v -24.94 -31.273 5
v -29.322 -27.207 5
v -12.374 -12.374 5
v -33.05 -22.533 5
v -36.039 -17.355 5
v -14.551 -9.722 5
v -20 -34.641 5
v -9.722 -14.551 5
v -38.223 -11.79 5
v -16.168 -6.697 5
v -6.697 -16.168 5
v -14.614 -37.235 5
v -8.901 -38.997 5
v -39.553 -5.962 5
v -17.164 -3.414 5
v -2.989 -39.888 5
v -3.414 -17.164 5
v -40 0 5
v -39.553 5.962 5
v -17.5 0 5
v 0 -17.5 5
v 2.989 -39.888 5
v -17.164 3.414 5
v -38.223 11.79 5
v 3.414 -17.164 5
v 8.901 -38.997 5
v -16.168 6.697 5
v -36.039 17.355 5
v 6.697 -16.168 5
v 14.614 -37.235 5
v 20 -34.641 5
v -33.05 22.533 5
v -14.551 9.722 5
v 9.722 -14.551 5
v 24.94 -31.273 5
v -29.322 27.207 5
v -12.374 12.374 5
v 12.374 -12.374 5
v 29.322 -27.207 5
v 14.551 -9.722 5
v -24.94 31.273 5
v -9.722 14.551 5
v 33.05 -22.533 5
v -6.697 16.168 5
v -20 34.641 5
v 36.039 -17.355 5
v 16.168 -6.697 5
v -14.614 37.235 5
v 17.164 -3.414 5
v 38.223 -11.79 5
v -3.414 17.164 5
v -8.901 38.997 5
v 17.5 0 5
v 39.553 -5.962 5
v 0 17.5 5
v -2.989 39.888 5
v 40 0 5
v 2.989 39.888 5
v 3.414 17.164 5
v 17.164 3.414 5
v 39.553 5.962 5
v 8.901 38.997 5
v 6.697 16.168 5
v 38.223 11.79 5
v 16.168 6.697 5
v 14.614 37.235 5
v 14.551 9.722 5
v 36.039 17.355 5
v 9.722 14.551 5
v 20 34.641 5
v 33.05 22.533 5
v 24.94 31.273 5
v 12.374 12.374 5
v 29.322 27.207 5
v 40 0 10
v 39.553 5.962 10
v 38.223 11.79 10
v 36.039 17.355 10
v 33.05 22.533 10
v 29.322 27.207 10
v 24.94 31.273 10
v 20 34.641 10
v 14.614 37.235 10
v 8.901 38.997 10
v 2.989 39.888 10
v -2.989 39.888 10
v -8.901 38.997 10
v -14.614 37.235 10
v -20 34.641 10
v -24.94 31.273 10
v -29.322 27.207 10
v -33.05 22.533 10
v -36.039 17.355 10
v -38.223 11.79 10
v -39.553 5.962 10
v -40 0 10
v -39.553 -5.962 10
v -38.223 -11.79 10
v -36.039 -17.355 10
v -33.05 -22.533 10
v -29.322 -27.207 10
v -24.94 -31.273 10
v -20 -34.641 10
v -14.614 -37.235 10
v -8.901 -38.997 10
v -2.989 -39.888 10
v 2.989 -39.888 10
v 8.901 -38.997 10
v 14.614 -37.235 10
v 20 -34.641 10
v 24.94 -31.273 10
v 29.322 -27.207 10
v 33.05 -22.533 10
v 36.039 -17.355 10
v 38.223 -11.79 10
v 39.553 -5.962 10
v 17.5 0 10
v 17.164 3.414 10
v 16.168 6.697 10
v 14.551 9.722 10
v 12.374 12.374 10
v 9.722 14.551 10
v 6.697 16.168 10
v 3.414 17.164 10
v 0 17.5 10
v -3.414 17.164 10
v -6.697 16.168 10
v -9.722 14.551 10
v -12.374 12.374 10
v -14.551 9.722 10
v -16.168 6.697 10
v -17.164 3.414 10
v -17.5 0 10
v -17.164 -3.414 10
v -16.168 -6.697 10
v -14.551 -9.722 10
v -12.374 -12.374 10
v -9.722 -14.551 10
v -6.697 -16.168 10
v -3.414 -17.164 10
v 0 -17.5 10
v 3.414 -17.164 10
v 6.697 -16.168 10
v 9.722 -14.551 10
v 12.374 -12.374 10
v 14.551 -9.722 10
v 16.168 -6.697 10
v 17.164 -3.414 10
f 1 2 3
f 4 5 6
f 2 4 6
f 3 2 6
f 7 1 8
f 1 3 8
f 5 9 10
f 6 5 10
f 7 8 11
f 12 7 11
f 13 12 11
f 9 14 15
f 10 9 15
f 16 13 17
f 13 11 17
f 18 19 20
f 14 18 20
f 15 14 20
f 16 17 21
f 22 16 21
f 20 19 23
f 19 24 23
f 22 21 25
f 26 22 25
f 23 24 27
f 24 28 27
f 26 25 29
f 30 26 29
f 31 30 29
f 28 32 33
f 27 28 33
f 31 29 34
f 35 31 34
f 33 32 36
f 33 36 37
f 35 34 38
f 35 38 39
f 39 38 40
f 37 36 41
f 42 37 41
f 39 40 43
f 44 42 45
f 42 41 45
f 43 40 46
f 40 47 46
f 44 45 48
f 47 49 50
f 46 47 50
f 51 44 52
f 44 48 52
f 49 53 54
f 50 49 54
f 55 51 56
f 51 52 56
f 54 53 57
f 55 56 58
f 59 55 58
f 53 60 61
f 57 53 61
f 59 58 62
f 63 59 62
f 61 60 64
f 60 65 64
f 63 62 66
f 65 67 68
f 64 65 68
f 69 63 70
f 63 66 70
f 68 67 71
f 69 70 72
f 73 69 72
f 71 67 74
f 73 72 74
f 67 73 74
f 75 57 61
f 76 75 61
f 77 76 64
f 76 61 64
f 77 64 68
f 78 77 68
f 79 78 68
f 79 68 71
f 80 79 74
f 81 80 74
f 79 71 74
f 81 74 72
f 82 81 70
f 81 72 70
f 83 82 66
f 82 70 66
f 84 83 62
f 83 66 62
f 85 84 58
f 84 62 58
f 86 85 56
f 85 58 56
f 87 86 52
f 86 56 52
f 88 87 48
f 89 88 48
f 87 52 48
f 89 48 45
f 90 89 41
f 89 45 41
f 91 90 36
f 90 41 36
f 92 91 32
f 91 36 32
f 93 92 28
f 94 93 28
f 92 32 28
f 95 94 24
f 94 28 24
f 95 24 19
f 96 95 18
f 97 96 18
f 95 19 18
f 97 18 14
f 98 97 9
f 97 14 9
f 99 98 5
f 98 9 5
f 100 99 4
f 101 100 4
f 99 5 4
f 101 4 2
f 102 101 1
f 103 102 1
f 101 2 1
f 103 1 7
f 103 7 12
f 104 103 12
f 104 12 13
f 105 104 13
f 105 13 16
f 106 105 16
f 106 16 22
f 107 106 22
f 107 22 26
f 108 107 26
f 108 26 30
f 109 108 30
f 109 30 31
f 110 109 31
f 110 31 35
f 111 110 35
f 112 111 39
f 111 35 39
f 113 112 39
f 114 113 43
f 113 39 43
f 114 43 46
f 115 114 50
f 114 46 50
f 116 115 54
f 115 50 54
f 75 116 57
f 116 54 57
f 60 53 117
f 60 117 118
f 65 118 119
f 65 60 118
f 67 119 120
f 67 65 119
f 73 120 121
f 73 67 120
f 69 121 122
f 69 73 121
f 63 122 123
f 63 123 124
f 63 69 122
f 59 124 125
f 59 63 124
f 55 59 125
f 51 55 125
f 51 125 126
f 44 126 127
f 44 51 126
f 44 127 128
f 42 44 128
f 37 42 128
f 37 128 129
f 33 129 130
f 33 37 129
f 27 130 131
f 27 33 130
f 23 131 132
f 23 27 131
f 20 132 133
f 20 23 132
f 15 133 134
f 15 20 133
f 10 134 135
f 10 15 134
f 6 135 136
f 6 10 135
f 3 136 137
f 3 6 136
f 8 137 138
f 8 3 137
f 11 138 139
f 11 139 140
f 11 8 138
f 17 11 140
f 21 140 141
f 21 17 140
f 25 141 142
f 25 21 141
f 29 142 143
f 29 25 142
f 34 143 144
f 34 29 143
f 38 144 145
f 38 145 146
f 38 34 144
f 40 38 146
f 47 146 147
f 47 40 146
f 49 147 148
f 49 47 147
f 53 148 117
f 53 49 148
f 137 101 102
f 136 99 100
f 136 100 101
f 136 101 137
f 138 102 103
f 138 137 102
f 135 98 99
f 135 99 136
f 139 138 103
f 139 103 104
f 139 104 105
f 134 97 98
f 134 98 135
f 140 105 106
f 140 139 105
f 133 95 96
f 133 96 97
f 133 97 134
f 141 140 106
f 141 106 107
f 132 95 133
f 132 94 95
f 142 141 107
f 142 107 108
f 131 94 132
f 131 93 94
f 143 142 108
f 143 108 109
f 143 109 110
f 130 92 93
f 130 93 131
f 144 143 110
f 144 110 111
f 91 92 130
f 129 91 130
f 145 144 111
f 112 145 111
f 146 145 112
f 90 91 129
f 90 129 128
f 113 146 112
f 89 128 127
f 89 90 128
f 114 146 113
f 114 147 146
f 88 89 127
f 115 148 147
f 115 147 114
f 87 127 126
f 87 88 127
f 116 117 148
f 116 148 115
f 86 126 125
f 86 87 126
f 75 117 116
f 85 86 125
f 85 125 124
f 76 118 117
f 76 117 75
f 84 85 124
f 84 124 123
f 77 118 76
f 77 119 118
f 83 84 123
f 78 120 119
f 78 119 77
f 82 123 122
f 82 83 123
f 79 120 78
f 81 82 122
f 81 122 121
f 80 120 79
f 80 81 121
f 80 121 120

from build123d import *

# Parameters (mm, degrees)
F0_R     = 290
F1_DEPTH = 5
F2_R     = 11
F3_DEPTH = 25
F4_DEPTH = 80
F5_R     = 150.146942
F5_R_2   = 11.5
F6_DEPTH = 5
F7_R     = 40
F7_R_2   = 17.5
F8_DEPTH = 5


with BuildPart() as f1:
    # F0 (on Top) → F1 (new body)
    with BuildSketch(Plane.XY):
        Circle(F0_R)
        with BuildLine():
            Line((-60.906023, -273.295548), (-40.174253, -195.923529))
            ThreePointArc((-40.174253, -195.923529), (-20.190272, -198.978273), (0, -200))
            Line((0, -200), (0, -280))
            ThreePointArc((0, -280), (-30.63696, -278.31884), (-60.906023, -273.295548))
        make_face(mode=Mode.SUBTRACT)
        with BuildLine():
            Line((-189.393937, -206.227875), (-132.753689, -149.587627))
            ThreePointArc((-132.753689, -149.587627), (-116.974424, -162.225103), (-100, -173.205081))
            Line((-100, -173.205081), (-140, -242.487113))
            ThreePointArc((-140, -242.487113), (-165.691806, -225.712706), (-189.393937, -206.227875))
        make_face(mode=Mode.SUBTRACT)
        with BuildLine():
            Line((-267.133899, -83.90161), (-189.76188, -63.169841))
            ThreePointArc((-189.76188, -63.169841), (-182.415375, -82.003848), (-173.205081, -100))
            Line((-173.205081, -100), (-242.487113, -140))
            ThreePointArc((-242.487113, -140), (-256.349666, -112.627034), (-267.133899, -83.90161))
        make_face(mode=Mode.SUBTRACT)
        with BuildLine():
            Line((-87.898705, -104.754322), (-73.813276, -87.967845))
            ThreePointArc((-73.813276, -87.967845), (-70.698431, -90.490183), (-67.49746, -92.902284))
            Line((-67.49746, -92.902284), (-80.377673, -110.630376))
            ThreePointArc((-80.377673, -110.630376), (-84.18947, -107.757986), (-87.898705, -104.754322))
        make_face(mode=Mode.SUBTRACT)
        with BuildLine():
            Line((-103.203713, -89.714236), (-86.665715, -75.337875))
            ThreePointArc((-86.665715, -75.337875), (-83.9838, -78.316428), (-81.199573, -81.199573))
            Line((-81.199573, -81.199573), (-96.694494, -96.694494))
            ThreePointArc((-96.694494, -96.694494), (-100.010021, -93.261172), (-103.203713, -89.714236))
        make_face(mode=Mode.SUBTRACT)
        with BuildLine():
            Line((-70.42934, -117.21501), (-59.143309, -98.431755))
            ThreePointArc((-59.143309, -98.431755), (-55.672233, -100.43577), (-52.133335, -102.317432))
            Line((-52.133335, -102.317432), (-62.081687, -121.842171))
            ThreePointArc((-62.081687, -121.842171), (-66.295895, -119.601441), (-70.42934, -117.21501))
        make_face(mode=Mode.SUBTRACT)
        with BuildLine():
            Line((-51.225771, -126.789475), (-43.017038, -106.471949))
            ThreePointArc((-43.017038, -106.471949), (-39.275199, -107.908295), (-35.485515, -109.213185))
            Line((-35.485515, -109.213185), (-42.257043, -130.053807))
            ThreePointArc((-42.257043, -130.053807), (-46.769895, -128.499912), (-51.225771, -126.789475))
        make_face(mode=Mode.SUBTRACT)
        with BuildLine():
            Line((-30.760853, -133.241962), (-25.831544, -111.89045))
            ThreePointArc((-25.831544, -111.89045), (-21.91108, -112.72376), (-17.963923, -113.419747))
            Line((-17.963923, -113.419747), (-21.391891, -135.063087))
            ThreePointArc((-21.391891, -135.063087), (-26.092265, -134.234288), (-30.760853, -133.241962))
        make_face(mode=Mode.SUBTRACT)
        with BuildLine():
            Line((-9.538501, -136.41359), (-8.009993, -114.553837))
            ThreePointArc((-8.009993, -114.553837), (-4.007437, -114.763591), (0, -114.833538))
            Line((0, -114.833538), (0, -136.746665))
            ThreePointArc((0, -136.746665), (-4.772157, -136.663371), (-9.538501, -136.41359))
        make_face(mode=Mode.SUBTRACT)
        with BuildLine():
            Line((-125.875787, -53.431607), (-105.704676, -44.869398))
            ThreePointArc((-105.704676, -44.869398), (-104.074447, -48.530927), (-102.317432, -52.133335))
            Line((-102.317432, -52.133335), (-121.842171, -62.081687))
            ThreePointArc((-121.842171, -62.081687), (-123.934469, -57.791849), (-125.875787, -53.431607))
        make_face(mode=Mode.SUBTRACT)
        with BuildLine():
            Line((-115.967502, -72.465087), (-97.384156, -60.852836))
            ThreePointArc((-97.384156, -60.852836), (-95.201208, -64.214262), (-92.902284, -67.49746))
            Line((-92.902284, -67.49746), (-110.630376, -80.377673))
            ThreePointArc((-110.630376, -80.377673), (-113.367993, -76.467958), (-115.967502, -72.465087))
        make_face(mode=Mode.SUBTRACT)
        with BuildLine():
            Line((-132.684592, -33.082464), (-111.422397, -27.781127))
            ThreePointArc((-111.422397, -27.781127), (-110.385028, -31.652601), (-109.213185, -35.485515))
            Line((-109.213185, -35.485515), (-130.053807, -42.257043))
            ThreePointArc((-130.053807, -42.257043), (-131.449267, -37.692713), (-132.684592, -33.082464))
        make_face(mode=Mode.SUBTRACT)
        with BuildLine():
            Line((-136.226262, -11.918721), (-114.396528, -10.008792))
            ThreePointArc((-114.396528, -10.008792), (-113.977562, -13.994882), (-113.419747, -17.963923))
            Line((-113.419747, -17.963923), (-135.063087, -21.391891))
            ThreePointArc((-135.063087, -21.391891), (-135.727348, -16.665457), (-136.226262, -11.918721))
        make_face(mode=Mode.SUBTRACT)
        with BuildLine():
            Line((83.90161, -267.133899), (63.169841, -189.76188))
            ThreePointArc((63.169841, -189.76188), (82.003848, -182.415375), (100, -173.205081))
            Line((100, -173.205081), (140, -242.487113))
            ThreePointArc((140, -242.487113), (112.627034, -256.349666), (83.90161, -267.133899))
        make_face(mode=Mode.SUBTRACT)
        with BuildLine():
            Line((11.918721, -136.226262), (10.008792, -114.396528))
            ThreePointArc((10.008792, -114.396528), (13.994882, -113.977562), (17.963923, -113.419747))
            Line((17.963923, -113.419747), (21.391891, -135.063087))
            ThreePointArc((21.391891, -135.063087), (16.665457, -135.727348), (11.918721, -136.226262))
        make_face(mode=Mode.SUBTRACT)
        with BuildLine():
            Line((33.082464, -132.684592), (27.781127, -111.422397))
            ThreePointArc((27.781127, -111.422397), (31.652601, -110.385028), (35.485515, -109.213185))
            Line((35.485515, -109.213185), (42.257043, -130.053807))
            ThreePointArc((42.257043, -130.053807), (37.692713, -131.449267), (33.082464, -132.684592))
        make_face(mode=Mode.SUBTRACT)
        with BuildLine():
            Line((53.431607, -125.875787), (44.869398, -105.704676))
            ThreePointArc((44.869398, -105.704676), (48.530927, -104.074447), (52.133335, -102.317432))
            Line((52.133335, -102.317432), (62.081687, -121.842171))
            ThreePointArc((62.081687, -121.842171), (57.791849, -123.934469), (53.431607, -125.875787))
        make_face(mode=Mode.SUBTRACT)
        with BuildLine():
            Line((72.465087, -115.967502), (60.852836, -97.384156))
            ThreePointArc((60.852836, -97.384156), (64.214262, -95.201208), (67.49746, -92.902284))
            Line((67.49746, -92.902284), (80.377673, -110.630376))
            ThreePointArc((80.377673, -110.630376), (76.467958, -113.367993), (72.465087, -115.967502))
        make_face(mode=Mode.SUBTRACT)
        with BuildLine():
            Line((89.714236, -103.203713), (75.337875, -86.665715))
            ThreePointArc((75.337875, -86.665715), (78.316428, -83.9838), (81.199573, -81.199573))
            Line((81.199573, -81.199573), (96.694494, -96.694494))
            ThreePointArc((96.694494, -96.694494), (93.261172, -100.010021), (89.714236, -103.203713))
        make_face(mode=Mode.SUBTRACT)
        with BuildLine():
            Line((104.754322, -87.898705), (87.967845, -73.813276))
            ThreePointArc((87.967845, -73.813276), (90.490183, -70.698431), (92.902284, -67.49746))
            Line((92.902284, -67.49746), (110.630376, -80.377673))
            ThreePointArc((110.630376, -80.377673), (107.757986, -84.18947), (104.754322, -87.898705))
        make_face(mode=Mode.SUBTRACT)
        with BuildLine():
            Line((117.21501, -70.42934), (98.431755, -59.143309))
            ThreePointArc((98.431755, -59.143309), (100.43577, -55.672233), (102.317432, -52.133335))
            Line((102.317432, -52.133335), (121.842171, -62.081687))
            ThreePointArc((121.842171, -62.081687), (119.601441, -66.295895), (117.21501, -70.42934))
        make_face(mode=Mode.SUBTRACT)
        with BuildLine():
            Line((126.789475, -51.225771), (106.471949, -43.017038))
            ThreePointArc((106.471949, -43.017038), (107.908295, -39.275199), (109.213185, -35.485515))
            Line((109.213185, -35.485515), (130.053807, -42.257043))
            ThreePointArc((130.053807, -42.257043), (128.499912, -46.769895), (126.789475, -51.225771))
        make_face(mode=Mode.SUBTRACT)
        with BuildLine():
            Line((133.241962, -30.760853), (111.89045, -25.831544))
            ThreePointArc((111.89045, -25.831544), (112.72376, -21.91108), (113.419747, -17.963923))
            Line((113.419747, -17.963923), (135.063087, -21.391891))
            ThreePointArc((135.063087, -21.391891), (134.234288, -26.092265), (133.241962, -30.760853))
        make_face(mode=Mode.SUBTRACT)
        with BuildLine():
            Line((136.41359, -9.538501), (114.553837, -8.009993))
            ThreePointArc((114.553837, -8.009993), (114.763591, -4.007437), (114.833538, 0))
            Line((114.833538, 0), (136.746665, 0))
            ThreePointArc((136.746665, 0), (136.663371, -4.772157), (136.41359, -9.538501))
        make_face(mode=Mode.SUBTRACT)
        with BuildLine():
            Line((206.227875, -189.393937), (149.587627, -132.753689))
            ThreePointArc((149.587627, -132.753689), (162.225103, -116.974424), (173.205081, -100))
            Line((173.205081, -100), (242.487113, -140))
            ThreePointArc((242.487113, -140), (225.712706, -165.691806), (206.227875, -189.393937))
        make_face(mode=Mode.SUBTRACT)
        with BuildLine():
            Line((273.295548, -60.906023), (195.923529, -40.174253))
            ThreePointArc((195.923529, -40.174253), (198.978273, -20.190272), (200, 0))
            Line((200, 0), (280, 0))
            ThreePointArc((280, 0), (278.31884, -30.63696), (273.295548, -60.906023))
        make_face(mode=Mode.SUBTRACT)
        with BuildLine():
            Line((-273.295548, 60.906023), (-195.923529, 40.174253))
            ThreePointArc((-195.923529, 40.174253), (-198.978273, 20.190272), (-200, 0))
            Line((-200, 0), (-280, 0))
            ThreePointArc((-280, 0), (-278.31884, 30.63696), (-273.295548, 60.906023))
        make_face(mode=Mode.SUBTRACT)
        with BuildLine():
            Line((-206.227875, 189.393937), (-149.587627, 132.753689))
            ThreePointArc((-149.587627, 132.753689), (-162.225103, 116.974424), (-173.205081, 100))
            Line((-173.205081, 100), (-242.487113, 140))
            ThreePointArc((-242.487113, 140), (-225.712706, 165.691806), (-206.227875, 189.393937))
        make_face(mode=Mode.SUBTRACT)
        with BuildLine():
            Line((-136.41359, 9.538501), (-114.553837, 8.009993))
            ThreePointArc((-114.553837, 8.009993), (-114.763591, 4.007437), (-114.833538, 0))
            Line((-114.833538, 0), (-136.746665, 0))
            ThreePointArc((-136.746665, 0), (-136.663371, 4.772157), (-136.41359, 9.538501))
        make_face(mode=Mode.SUBTRACT)
        with BuildLine():
            Line((-133.241962, 30.760853), (-111.89045, 25.831544))
            ThreePointArc((-111.89045, 25.831544), (-112.72376, 21.91108), (-113.419747, 17.963923))
            Line((-113.419747, 17.963923), (-135.063087, 21.391891))
            ThreePointArc((-135.063087, 21.391891), (-134.234288, 26.092265), (-133.241962, 30.760853))
        make_face(mode=Mode.SUBTRACT)
        with BuildLine():
            Line((-126.789475, 51.225771), (-106.471949, 43.017038))
            ThreePointArc((-106.471949, 43.017038), (-107.908295, 39.275199), (-109.213185, 35.485515))
            Line((-109.213185, 35.485515), (-130.053807, 42.257043))
            ThreePointArc((-130.053807, 42.257043), (-128.499912, 46.769895), (-126.789475, 51.225771))
        make_face(mode=Mode.SUBTRACT)
        with BuildLine():
            Line((-117.21501, 70.42934), (-98.431755, 59.143309))
            ThreePointArc((-98.431755, 59.143309), (-100.43577, 55.672233), (-102.317432, 52.133335))
            Line((-102.317432, 52.133335), (-121.842171, 62.081687))
            ThreePointArc((-121.842171, 62.081687), (-119.601441, 66.295895), (-117.21501, 70.42934))
        make_face(mode=Mode.SUBTRACT)
        with BuildLine():
            Line((-104.754322, 87.898705), (-87.967845, 73.813276))
            ThreePointArc((-87.967845, 73.813276), (-90.490183, 70.698431), (-92.902284, 67.49746))
            Line((-92.902284, 67.49746), (-110.630376, 80.377673))
            ThreePointArc((-110.630376, 80.377673), (-107.757986, 84.18947), (-104.754322, 87.898705))
        make_face(mode=Mode.SUBTRACT)
        with BuildLine():
            Line((-89.714236, 103.203713), (-75.337875, 86.665715))
            ThreePointArc((-75.337875, 86.665715), (-78.316428, 83.9838), (-81.199573, 81.199573))
            Line((-81.199573, 81.199573), (-96.694494, 96.694494))
            ThreePointArc((-96.694494, 96.694494), (-93.261172, 100.010021), (-89.714236, 103.203713))
        make_face(mode=Mode.SUBTRACT)
        with BuildLine():
            Line((-72.465087, 115.967502), (-60.852836, 97.384156))
            ThreePointArc((-60.852836, 97.384156), (-64.214262, 95.201208), (-67.49746, 92.902284))
            Line((-67.49746, 92.902284), (-80.377673, 110.630376))
            ThreePointArc((-80.377673, 110.630376), (-76.467958, 113.367993), (-72.465087, 115.967502))
        make_face(mode=Mode.SUBTRACT)
        with BuildLine():
            Line((-53.431607, 125.875787), (-44.869398, 105.704676))
            ThreePointArc((-44.869398, 105.704676), (-48.530927, 104.074447), (-52.133335, 102.317432))
            Line((-52.133335, 102.317432), (-62.081687, 121.842171))
            ThreePointArc((-62.081687, 121.842171), (-57.791849, 123.934469), (-53.431607, 125.875787))
        make_face(mode=Mode.SUBTRACT)
        with BuildLine():
            Line((-33.082464, 132.684592), (-27.781127, 111.422397))
            ThreePointArc((-27.781127, 111.422397), (-31.652601, 110.385028), (-35.485515, 109.213185))
            Line((-35.485515, 109.213185), (-42.257043, 130.053807))
            ThreePointArc((-42.257043, 130.053807), (-37.692713, 131.449267), (-33.082464, 132.684592))
        make_face(mode=Mode.SUBTRACT)
        with BuildLine():
            Line((-11.918721, 136.226262), (-10.008792, 114.396528))
            ThreePointArc((-10.008792, 114.396528), (-13.994882, 113.977562), (-17.963923, 113.419747))
            Line((-17.963923, 113.419747), (-21.391891, 135.063087))
            ThreePointArc((-21.391891, 135.063087), (-16.665457, 135.727348), (-11.918721, 136.226262))
        make_face(mode=Mode.SUBTRACT)
        with BuildLine():
            Line((-83.90161, 267.133899), (-63.169841, 189.76188))
            ThreePointArc((-63.169841, 189.76188), (-82.003848, 182.415375), (-100, 173.205081))
            Line((-100, 173.205081), (-140, 242.487113))
            ThreePointArc((-140, 242.487113), (-112.627034, 256.349666), (-83.90161, 267.133899))
        make_face(mode=Mode.SUBTRACT)
        Polygon((5, 5), (5, -5), (-5, -5), (-5, 5), (0, 5), align=None, mode=Mode.SUBTRACT)
        with BuildLine():
            Line((136.226262, 11.918721), (114.396528, 10.008792))
            ThreePointArc((114.396528, 10.008792), (113.977562, 13.994882), (113.419747, 17.963923))
            Line((113.419747, 17.963923), (135.063087, 21.391891))
            ThreePointArc((135.063087, 21.391891), (135.727348, 16.665457), (136.226262, 11.918721))
        make_face(mode=Mode.SUBTRACT)
        with BuildLine():
            Line((132.684592, 33.082464), (111.422397, 27.781127))
            ThreePointArc((111.422397, 27.781127), (110.385028, 31.652601), (109.213185, 35.485515))
            Line((109.213185, 35.485515), (130.053807, 42.257043))
            ThreePointArc((130.053807, 42.257043), (131.449267, 37.692713), (132.684592, 33.082464))
        make_face(mode=Mode.SUBTRACT)
        with BuildLine():
            Line((115.967502, 72.465087), (97.384156, 60.852836))
            ThreePointArc((97.384156, 60.852836), (95.201208, 64.214262), (92.902284, 67.49746))
            Line((92.902284, 67.49746), (110.630376, 80.377673))
            ThreePointArc((110.630376, 80.377673), (113.367993, 76.467958), (115.967502, 72.465087))
        make_face(mode=Mode.SUBTRACT)
        with BuildLine():
            Line((125.875787, 53.431607), (105.704676, 44.869398))
            ThreePointArc((105.704676, 44.869398), (104.074447, 48.530927), (102.317432, 52.133335))
            Line((102.317432, 52.133335), (121.842171, 62.081687))
            ThreePointArc((121.842171, 62.081687), (123.934469, 57.791849), (125.875787, 53.431607))
        make_face(mode=Mode.SUBTRACT)
        with BuildLine():
            ThreePointArc((0, 136.746665), (4.772157, 136.663371), (9.538501, 136.41359))
            Line((9.538501, 136.41359), (8.009993, 114.553837))
            ThreePointArc((8.009993, 114.553837), (4.007437, 114.763591), (0, 114.833538))
            Line((0, 114.833538), (0, 136.746665))
        make_face(mode=Mode.SUBTRACT)
        with BuildLine():
            Line((30.760853, 133.241962), (25.831544, 111.89045))
            ThreePointArc((25.831544, 111.89045), (21.91108, 112.72376), (17.963923, 113.419747))
            Line((17.963923, 113.419747), (21.391891, 135.063087))
            ThreePointArc((21.391891, 135.063087), (26.092265, 134.234288), (30.760853, 133.241962))
        make_face(mode=Mode.SUBTRACT)
        with BuildLine():
            Line((51.225771, 126.789475), (43.017038, 106.471949))
            ThreePointArc((43.017038, 106.471949), (39.275199, 107.908295), (35.485515, 109.213185))
            Line((35.485515, 109.213185), (42.257043, 130.053807))
            ThreePointArc((42.257043, 130.053807), (46.769895, 128.499912), (51.225771, 126.789475))
        make_face(mode=Mode.SUBTRACT)
        with BuildLine():
            Line((70.42934, 117.21501), (59.143309, 98.431755))
            ThreePointArc((59.143309, 98.431755), (55.672233, 100.43577), (52.133335, 102.317432))
            Line((52.133335, 102.317432), (62.081687, 121.842171))
            ThreePointArc((62.081687, 121.842171), (66.295895, 119.601441), (70.42934, 117.21501))
        make_face(mode=Mode.SUBTRACT)
        with BuildLine():
            Line((103.203713, 89.714236), (86.665715, 75.337875))
            ThreePointArc((86.665715, 75.337875), (83.9838, 78.316428), (81.199573, 81.199573))
            Line((81.199573, 81.199573), (96.694494, 96.694494))
            ThreePointArc((96.694494, 96.694494), (100.010021, 93.261172), (103.203713, 89.714236))
        make_face(mode=Mode.SUBTRACT)
        with BuildLine():
            Line((87.898705, 104.754322), (73.813276, 87.967845))
            ThreePointArc((73.813276, 87.967845), (70.698431, 90.490183), (67.49746, 92.902284))
            Line((67.49746, 92.902284), (80.377673, 110.630376))
            ThreePointArc((80.377673, 110.630376), (84.18947, 107.757986), (87.898705, 104.754322))
        make_face(mode=Mode.SUBTRACT)
        with BuildLine():
            Line((267.133899, 83.90161), (189.76188, 63.169841))
            ThreePointArc((189.76188, 63.169841), (182.415375, 82.003848), (173.205081, 100))
            Line((173.205081, 100), (242.487113, 140))
            ThreePointArc((242.487113, 140), (256.349666, 112.627034), (267.133899, 83.90161))
        make_face(mode=Mode.SUBTRACT)
        with BuildLine():
            Line((189.393937, 206.227875), (132.753689, 149.587627))
            ThreePointArc((132.753689, 149.587627), (116.974424, 162.225103), (100, 173.205081))
            Line((100, 173.205081), (140, 242.487113))
            ThreePointArc((140, 242.487113), (165.691806, 225.712706), (189.393937, 206.227875))
        make_face(mode=Mode.SUBTRACT)
        with BuildLine():
            Line((60.906023, 273.295548), (40.174253, 195.923529))
            ThreePointArc((40.174253, 195.923529), (20.190272, 198.978273), (0, 200))
            Line((0, 200), (0, 280))
            ThreePointArc((0, 280), (30.63696, 278.31884), (60.906023, 273.295548))
        make_face(mode=Mode.SUBTRACT)
        Polygon((-5, -5), (5, -5), (5, 5), (0, 5), (-5, 5), align=None)
    extrude(amount=F1_DEPTH)

    # F2 (on face) → F3 (cut)
    with BuildSketch(Plane.XY.offset(5)):
        Circle(F2_R)
    extrude(amount=-F3_DEPTH, mode=Mode.SUBTRACT)

    # F5 (on face) → F6 (join)
    with BuildSketch(Plane.XY.offset(5)):
        Circle(F5_R)
        Circle(F5_R_2, mode=Mode.SUBTRACT)
    extrude(amount=-F6_DEPTH)


with BuildPart() as f4:
    # F2 (on face) → F4 (new body)
    with BuildSketch(Plane.XY.offset(5)):
        Circle(F2_R)
    extrude(amount=F4_DEPTH)


with BuildPart() as f8:
    # F7 (on face) → F8 (new body)
    with BuildSketch(Plane.XY.offset(5)):
        Circle(F7_R)
        Circle(F7_R_2, mode=Mode.SUBTRACT)
    extrude(amount=F8_DEPTH)


solid = f8.part
